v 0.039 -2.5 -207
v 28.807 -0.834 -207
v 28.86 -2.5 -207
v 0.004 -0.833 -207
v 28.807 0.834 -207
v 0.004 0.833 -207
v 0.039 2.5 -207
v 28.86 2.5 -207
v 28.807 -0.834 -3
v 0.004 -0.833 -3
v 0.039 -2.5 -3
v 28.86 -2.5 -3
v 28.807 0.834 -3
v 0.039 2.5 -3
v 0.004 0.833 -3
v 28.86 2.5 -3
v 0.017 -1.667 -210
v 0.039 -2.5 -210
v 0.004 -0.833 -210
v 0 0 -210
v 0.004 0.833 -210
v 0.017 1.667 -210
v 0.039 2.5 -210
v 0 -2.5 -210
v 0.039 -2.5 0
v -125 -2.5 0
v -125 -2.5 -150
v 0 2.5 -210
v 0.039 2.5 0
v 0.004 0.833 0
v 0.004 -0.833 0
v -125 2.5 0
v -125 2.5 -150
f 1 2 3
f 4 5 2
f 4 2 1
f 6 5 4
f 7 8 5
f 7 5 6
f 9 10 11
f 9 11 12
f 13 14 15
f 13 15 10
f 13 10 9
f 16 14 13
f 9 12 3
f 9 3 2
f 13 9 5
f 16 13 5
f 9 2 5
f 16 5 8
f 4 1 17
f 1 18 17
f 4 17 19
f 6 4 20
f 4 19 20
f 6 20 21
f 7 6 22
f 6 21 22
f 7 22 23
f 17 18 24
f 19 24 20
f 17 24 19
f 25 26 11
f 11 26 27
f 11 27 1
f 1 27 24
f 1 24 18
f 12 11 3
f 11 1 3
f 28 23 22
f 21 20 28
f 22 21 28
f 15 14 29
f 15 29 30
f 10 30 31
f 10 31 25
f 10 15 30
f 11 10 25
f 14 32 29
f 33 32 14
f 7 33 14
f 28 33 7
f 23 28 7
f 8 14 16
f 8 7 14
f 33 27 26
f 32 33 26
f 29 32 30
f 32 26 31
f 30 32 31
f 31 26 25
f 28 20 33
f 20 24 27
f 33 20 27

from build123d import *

# Parameters (mm, degrees)
BOSS_EXTRUDE1_DEPTH      = 2.5
BOSS_EXTRUDE1_DEPTH_BACK = 2.5
SKETCH2_R                = 51.95
CUT_EXTRUDE1_DEPTH       = 245.399774959
SKETCH3_R                = 80.75
CUT_EXTRUDE2_DEPTH       = 3
CUT_EXTRUDE3_START       = -3
SKETCH4_R                = 80.75
CUT_EXTRUDE3_DEPTH       = 3


with BuildPart() as part:
    # Sketch1 → Boss-Extrude1 (new, two sides: drawn at the far end of the back side and taken through both)
    with BuildSketch(Plane(origin=(0, 0, 0), x_dir=(1, 0, 0), z_dir=(0, 1, 0)).offset(-BOSS_EXTRUDE1_DEPTH_BACK)):
        Polygon((-125, 150), (-125, 0), (0, 0), (80.75, 0), (80.75, 210), (0, 210), align=None)
    extrude(amount=BOSS_EXTRUDE1_DEPTH + BOSS_EXTRUDE1_DEPTH_BACK)

    # Sketch2 → Cut-Extrude1 (cut, through all)
    with BuildSketch(Plane(origin=(0, 0, -210), x_dir=(-1, 0, 0), z_dir=(0, 0, -1))):
        with Locations((-80.75, 0)):
            Circle(SKETCH2_R)
    extrude(amount=-CUT_EXTRUDE1_DEPTH, mode=Mode.SUBTRACT)

    # Sketch3 → Cut-Extrude2 (cut)
    with BuildSketch(Plane(origin=(0, 0, -210), x_dir=(-1, 0, 0), z_dir=(0, 0, -1))):
        with Locations((-80.75, 0)):
            Circle(SKETCH3_R)
    extrude(amount=-CUT_EXTRUDE2_DEPTH, mode=Mode.SUBTRACT)

    # Sketch4 → Cut-Extrude3 (cut)
    with BuildSketch(Plane.XY.offset(CUT_EXTRUDE3_START)):
        with Locations((80.75, 0)):
            Circle(SKETCH4_R)
    extrude(amount=CUT_EXTRUDE3_DEPTH, mode=Mode.SUBTRACT)


solid = part.part
